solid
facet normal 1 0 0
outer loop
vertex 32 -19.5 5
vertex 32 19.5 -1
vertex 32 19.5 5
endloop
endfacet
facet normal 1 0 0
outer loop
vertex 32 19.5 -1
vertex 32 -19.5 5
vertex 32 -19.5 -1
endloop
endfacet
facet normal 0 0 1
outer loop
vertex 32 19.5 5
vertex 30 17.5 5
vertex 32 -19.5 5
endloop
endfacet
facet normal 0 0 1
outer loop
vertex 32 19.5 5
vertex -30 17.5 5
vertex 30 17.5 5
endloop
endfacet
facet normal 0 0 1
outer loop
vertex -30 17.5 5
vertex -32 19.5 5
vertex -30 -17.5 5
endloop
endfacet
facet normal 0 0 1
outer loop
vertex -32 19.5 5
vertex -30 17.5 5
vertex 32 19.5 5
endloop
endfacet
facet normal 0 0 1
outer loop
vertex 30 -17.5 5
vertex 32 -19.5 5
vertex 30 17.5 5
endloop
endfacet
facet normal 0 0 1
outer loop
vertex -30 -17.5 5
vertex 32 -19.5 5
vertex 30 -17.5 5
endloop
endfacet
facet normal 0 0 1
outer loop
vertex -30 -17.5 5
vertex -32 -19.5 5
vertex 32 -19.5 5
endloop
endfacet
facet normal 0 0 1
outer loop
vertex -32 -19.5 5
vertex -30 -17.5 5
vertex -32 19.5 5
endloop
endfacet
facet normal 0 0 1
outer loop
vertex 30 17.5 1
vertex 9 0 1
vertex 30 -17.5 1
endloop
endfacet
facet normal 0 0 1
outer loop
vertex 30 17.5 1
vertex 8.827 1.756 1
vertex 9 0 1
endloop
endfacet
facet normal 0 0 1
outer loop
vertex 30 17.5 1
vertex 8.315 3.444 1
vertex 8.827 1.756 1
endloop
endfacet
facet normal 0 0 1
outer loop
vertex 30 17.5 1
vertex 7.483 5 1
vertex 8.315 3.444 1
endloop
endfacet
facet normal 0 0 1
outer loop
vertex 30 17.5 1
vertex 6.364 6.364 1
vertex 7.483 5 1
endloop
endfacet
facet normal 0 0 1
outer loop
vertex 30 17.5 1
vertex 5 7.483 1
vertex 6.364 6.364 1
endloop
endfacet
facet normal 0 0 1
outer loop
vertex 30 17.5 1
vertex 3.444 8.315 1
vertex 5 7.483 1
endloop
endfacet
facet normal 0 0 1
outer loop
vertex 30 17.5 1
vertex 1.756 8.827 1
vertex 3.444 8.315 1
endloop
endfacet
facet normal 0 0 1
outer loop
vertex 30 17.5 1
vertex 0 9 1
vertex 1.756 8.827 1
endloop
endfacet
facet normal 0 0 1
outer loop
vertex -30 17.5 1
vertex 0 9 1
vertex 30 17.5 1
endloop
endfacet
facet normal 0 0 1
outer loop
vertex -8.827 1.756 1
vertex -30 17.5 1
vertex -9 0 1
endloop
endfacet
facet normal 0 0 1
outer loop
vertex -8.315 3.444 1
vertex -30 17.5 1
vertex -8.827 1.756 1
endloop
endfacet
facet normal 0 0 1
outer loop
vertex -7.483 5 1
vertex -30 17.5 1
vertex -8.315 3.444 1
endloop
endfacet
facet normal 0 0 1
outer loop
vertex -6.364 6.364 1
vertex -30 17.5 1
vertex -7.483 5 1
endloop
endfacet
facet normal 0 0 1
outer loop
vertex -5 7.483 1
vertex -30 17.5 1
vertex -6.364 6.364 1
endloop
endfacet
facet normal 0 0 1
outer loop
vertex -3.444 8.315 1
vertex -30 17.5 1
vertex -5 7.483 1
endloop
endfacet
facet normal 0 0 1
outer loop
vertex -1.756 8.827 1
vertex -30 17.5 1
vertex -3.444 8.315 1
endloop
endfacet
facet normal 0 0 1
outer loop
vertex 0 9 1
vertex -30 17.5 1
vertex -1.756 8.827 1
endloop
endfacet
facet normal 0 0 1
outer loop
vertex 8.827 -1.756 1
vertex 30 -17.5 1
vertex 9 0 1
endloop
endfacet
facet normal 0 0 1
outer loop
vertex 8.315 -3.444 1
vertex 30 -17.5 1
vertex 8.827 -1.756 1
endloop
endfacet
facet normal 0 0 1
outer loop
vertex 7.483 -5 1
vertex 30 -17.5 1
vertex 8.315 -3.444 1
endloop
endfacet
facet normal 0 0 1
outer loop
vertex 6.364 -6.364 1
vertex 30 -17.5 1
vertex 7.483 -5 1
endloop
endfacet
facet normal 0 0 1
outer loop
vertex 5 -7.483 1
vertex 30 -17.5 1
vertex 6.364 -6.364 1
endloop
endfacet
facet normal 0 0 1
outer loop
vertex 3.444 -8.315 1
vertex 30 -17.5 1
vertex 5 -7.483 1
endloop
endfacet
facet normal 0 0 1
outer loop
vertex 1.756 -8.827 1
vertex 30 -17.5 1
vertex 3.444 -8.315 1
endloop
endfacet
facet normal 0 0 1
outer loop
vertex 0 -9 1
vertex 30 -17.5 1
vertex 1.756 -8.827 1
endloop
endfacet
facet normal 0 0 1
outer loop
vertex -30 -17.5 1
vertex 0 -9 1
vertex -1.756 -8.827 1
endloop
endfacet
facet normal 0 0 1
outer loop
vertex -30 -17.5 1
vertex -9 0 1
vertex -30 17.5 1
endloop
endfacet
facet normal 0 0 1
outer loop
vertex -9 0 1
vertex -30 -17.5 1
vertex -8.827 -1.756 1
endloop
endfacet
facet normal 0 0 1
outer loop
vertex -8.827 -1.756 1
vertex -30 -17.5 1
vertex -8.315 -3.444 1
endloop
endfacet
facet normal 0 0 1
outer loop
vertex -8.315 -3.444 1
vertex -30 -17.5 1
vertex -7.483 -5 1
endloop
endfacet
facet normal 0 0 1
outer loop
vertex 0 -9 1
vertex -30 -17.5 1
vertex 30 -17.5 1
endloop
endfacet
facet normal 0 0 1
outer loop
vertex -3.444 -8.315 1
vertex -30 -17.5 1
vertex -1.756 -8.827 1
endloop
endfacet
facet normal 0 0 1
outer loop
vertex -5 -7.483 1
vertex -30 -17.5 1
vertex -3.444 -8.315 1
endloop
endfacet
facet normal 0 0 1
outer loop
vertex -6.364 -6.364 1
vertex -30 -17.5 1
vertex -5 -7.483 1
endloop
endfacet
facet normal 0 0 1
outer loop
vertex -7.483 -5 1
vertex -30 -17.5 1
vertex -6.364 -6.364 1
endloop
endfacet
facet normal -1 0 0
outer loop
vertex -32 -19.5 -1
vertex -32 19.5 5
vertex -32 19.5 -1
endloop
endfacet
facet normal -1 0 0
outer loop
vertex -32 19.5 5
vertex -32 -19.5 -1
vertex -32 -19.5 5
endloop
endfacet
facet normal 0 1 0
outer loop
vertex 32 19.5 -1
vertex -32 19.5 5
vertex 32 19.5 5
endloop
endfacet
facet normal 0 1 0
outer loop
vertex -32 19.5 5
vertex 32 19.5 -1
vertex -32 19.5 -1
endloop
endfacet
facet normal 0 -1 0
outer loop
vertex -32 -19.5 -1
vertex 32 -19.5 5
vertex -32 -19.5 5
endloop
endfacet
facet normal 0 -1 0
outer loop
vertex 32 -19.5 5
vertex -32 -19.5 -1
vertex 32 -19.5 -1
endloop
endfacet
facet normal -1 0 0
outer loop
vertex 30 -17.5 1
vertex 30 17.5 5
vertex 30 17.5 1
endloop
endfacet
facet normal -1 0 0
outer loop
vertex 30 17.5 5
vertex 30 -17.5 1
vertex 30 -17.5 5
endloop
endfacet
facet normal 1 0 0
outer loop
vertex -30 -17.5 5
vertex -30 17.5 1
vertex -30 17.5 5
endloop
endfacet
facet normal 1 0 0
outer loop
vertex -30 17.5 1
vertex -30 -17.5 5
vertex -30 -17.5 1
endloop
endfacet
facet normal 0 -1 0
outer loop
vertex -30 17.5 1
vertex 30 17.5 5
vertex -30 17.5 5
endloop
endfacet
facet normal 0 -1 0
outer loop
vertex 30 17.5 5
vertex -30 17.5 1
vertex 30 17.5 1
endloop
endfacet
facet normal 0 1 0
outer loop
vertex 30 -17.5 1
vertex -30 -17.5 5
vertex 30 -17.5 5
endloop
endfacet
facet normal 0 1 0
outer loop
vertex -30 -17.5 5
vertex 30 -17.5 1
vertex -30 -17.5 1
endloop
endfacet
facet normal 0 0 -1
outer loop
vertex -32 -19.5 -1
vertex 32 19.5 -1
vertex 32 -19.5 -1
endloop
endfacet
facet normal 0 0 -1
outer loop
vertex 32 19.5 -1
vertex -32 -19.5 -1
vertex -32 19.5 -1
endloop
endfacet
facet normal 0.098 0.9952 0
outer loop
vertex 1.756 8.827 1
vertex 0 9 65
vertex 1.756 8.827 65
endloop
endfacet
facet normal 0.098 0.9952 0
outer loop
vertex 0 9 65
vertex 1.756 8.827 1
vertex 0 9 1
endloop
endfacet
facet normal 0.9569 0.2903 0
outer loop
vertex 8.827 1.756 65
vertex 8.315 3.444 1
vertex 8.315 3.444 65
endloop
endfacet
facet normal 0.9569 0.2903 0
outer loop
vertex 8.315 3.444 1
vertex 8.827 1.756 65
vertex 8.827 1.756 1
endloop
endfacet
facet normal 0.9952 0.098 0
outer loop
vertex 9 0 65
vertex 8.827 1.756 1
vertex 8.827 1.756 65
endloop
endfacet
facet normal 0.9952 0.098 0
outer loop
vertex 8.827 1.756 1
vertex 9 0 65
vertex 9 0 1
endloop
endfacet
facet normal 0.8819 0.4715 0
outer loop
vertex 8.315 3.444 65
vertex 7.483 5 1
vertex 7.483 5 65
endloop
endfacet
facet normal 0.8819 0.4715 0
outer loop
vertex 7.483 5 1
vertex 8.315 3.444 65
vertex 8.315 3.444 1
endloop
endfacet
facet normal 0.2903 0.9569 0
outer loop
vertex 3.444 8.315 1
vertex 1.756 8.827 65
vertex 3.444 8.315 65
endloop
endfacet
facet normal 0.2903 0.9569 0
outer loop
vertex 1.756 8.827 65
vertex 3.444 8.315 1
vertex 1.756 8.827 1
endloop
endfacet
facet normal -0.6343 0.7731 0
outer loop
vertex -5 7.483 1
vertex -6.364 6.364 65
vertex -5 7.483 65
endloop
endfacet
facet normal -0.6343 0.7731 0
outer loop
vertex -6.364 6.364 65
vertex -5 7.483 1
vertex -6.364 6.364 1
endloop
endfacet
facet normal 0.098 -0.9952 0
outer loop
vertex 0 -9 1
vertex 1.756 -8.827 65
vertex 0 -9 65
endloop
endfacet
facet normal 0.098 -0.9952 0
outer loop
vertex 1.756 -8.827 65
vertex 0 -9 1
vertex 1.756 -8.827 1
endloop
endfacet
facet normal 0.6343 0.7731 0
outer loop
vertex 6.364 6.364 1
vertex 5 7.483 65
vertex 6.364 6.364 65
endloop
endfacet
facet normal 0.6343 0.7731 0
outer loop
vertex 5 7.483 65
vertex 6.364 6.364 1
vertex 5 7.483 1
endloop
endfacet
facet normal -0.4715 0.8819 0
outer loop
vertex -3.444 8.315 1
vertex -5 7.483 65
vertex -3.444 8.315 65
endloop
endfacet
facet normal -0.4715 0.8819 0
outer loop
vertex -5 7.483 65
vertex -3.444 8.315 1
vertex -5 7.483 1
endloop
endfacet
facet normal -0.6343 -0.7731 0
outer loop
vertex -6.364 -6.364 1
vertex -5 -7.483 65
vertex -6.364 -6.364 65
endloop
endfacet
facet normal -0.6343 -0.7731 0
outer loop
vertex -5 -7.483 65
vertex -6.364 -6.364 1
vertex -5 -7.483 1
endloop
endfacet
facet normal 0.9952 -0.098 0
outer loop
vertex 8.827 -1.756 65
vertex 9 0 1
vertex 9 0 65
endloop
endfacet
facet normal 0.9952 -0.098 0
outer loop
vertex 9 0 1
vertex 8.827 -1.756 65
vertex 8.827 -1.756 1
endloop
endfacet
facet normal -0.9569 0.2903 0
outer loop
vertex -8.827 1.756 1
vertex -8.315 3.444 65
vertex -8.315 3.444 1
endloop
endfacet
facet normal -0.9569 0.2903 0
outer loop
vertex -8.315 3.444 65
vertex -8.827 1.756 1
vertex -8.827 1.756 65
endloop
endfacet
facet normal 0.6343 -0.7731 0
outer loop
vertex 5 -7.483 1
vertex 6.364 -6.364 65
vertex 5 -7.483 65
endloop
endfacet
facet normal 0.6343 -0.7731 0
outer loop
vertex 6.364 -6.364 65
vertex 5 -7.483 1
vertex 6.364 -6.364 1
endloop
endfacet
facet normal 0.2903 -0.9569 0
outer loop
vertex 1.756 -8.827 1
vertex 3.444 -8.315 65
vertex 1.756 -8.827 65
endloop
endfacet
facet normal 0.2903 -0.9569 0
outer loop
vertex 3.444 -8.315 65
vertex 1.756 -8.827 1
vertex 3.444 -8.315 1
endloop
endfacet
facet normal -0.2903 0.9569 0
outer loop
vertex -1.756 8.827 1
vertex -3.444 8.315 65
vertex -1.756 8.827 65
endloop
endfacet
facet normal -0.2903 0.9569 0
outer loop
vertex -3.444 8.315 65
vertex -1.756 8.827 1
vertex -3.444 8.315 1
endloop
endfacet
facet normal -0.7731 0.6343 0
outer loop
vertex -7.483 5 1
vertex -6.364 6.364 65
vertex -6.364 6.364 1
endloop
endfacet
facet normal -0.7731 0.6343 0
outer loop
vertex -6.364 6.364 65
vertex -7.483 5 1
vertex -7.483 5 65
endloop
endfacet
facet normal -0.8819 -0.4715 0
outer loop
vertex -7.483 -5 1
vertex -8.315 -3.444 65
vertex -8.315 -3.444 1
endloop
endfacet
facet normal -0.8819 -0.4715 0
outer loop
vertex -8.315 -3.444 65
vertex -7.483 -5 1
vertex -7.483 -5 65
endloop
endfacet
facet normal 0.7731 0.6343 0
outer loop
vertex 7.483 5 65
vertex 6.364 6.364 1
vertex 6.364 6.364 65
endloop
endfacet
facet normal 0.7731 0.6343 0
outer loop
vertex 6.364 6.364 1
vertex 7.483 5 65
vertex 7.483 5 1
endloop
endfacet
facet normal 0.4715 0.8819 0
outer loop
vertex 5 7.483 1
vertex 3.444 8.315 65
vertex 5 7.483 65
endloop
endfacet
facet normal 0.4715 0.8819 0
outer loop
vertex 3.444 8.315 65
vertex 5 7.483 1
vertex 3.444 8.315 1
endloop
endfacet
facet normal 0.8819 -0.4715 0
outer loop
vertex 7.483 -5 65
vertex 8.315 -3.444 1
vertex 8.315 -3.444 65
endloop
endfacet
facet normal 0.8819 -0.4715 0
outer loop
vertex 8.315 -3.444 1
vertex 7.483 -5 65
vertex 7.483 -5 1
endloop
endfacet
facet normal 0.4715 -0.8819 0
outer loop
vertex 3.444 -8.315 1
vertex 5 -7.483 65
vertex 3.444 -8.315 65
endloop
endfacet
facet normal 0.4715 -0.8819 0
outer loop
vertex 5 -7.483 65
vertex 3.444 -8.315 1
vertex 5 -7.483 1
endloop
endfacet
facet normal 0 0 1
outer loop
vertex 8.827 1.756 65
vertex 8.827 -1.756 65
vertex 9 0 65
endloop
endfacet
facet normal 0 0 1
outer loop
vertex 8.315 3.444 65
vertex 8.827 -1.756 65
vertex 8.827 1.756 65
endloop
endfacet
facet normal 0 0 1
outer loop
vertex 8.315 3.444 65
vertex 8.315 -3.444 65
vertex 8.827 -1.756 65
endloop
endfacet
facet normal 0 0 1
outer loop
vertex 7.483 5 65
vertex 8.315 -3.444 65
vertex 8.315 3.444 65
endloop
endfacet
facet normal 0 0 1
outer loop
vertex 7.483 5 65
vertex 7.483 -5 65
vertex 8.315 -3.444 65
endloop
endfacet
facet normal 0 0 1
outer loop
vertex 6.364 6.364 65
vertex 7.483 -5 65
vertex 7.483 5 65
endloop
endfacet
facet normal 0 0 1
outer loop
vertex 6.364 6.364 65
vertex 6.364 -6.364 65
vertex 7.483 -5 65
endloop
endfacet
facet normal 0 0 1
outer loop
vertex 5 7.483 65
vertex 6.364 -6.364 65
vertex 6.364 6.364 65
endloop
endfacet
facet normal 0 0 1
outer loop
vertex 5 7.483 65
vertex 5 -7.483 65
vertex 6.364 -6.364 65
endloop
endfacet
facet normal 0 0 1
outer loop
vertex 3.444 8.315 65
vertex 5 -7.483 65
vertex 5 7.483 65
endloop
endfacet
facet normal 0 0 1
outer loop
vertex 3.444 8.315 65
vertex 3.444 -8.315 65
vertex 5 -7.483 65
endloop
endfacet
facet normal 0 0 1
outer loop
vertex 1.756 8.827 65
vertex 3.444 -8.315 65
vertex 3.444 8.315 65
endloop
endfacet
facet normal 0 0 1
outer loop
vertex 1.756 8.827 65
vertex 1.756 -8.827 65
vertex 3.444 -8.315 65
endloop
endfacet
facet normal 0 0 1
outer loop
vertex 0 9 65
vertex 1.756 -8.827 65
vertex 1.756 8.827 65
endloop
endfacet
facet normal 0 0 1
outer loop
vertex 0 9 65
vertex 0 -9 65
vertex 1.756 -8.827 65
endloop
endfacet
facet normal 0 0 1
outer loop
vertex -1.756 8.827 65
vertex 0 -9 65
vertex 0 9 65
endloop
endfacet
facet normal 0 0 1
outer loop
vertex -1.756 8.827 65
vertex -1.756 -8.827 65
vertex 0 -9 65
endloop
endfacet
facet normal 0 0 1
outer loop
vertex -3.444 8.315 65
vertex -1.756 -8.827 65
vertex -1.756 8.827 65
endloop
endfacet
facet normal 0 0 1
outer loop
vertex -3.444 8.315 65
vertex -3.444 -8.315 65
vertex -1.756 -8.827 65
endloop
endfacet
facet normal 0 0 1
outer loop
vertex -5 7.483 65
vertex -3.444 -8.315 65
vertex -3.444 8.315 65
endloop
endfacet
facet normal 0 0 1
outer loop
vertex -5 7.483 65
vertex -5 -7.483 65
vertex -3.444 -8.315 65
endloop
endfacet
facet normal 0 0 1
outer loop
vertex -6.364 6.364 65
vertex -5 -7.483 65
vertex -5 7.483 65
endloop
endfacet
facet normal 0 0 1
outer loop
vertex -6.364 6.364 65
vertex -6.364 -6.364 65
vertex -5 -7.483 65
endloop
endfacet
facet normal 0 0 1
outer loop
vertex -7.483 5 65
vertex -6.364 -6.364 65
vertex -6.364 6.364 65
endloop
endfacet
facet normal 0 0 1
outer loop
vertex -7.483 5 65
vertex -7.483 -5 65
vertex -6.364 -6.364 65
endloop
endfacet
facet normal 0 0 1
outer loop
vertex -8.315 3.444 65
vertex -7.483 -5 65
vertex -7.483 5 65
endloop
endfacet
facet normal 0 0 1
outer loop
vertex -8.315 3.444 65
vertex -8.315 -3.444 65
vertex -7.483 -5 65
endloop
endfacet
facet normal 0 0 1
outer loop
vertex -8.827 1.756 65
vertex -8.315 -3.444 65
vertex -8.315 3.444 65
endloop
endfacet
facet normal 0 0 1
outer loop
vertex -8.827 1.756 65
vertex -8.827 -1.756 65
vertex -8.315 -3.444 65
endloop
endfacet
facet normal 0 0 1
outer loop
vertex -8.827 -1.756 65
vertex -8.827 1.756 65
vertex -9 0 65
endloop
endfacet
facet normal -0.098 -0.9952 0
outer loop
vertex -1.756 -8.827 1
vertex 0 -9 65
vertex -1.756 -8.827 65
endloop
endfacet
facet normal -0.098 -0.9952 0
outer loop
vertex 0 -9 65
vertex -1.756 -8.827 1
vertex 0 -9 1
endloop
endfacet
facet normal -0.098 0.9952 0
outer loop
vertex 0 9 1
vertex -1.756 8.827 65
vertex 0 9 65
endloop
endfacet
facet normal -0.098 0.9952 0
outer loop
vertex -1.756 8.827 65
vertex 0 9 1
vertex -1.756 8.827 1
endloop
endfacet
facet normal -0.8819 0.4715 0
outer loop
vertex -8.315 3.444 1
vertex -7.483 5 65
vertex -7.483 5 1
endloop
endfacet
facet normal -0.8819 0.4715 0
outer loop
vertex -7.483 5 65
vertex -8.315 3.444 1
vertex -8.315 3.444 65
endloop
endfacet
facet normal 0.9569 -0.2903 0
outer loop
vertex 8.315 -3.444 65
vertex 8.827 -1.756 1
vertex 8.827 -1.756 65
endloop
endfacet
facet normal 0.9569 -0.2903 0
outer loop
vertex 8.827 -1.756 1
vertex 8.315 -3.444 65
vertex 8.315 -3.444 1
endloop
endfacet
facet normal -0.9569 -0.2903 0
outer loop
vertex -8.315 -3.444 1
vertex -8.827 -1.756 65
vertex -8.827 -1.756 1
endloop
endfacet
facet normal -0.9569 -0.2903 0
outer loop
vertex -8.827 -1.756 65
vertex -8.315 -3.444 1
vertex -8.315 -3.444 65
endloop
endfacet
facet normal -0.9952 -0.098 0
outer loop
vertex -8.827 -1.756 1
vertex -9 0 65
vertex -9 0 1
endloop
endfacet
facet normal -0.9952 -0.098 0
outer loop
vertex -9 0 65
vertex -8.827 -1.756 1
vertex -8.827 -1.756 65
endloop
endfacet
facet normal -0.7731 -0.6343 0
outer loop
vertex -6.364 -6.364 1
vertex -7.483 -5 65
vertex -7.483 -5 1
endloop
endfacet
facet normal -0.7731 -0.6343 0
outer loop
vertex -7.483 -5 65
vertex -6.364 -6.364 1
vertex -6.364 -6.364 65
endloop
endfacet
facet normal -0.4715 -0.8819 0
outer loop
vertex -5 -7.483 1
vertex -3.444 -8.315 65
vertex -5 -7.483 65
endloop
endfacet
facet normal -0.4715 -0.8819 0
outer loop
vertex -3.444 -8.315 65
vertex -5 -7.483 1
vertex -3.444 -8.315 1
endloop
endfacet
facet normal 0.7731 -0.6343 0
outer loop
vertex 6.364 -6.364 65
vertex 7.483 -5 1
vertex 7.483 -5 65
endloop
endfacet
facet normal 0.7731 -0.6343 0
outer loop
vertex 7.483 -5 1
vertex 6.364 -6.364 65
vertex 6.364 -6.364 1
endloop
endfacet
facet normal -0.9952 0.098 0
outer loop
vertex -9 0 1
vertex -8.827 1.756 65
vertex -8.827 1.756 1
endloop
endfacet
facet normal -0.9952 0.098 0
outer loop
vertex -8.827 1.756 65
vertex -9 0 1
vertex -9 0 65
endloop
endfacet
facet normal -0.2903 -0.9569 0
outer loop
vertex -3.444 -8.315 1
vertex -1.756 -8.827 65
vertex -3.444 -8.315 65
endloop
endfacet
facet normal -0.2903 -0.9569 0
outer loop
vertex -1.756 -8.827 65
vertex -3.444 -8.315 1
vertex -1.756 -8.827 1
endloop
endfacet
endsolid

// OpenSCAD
// file: akkum18650.scad
echo("Работа Тимура Огрельцева");

akkum18650();
module akkum18650() {
color("purple")
cylinder(d=18, h=65, $fn=32);
}
// main file
use <akkum18650.scad>

echo("Работа Огорельцева Тимура!");
w_frame = 65;
d_frame = 5;
h_frame = 40;
fitnes_frame = 4;

w_back = 60;
h_back = 35;
thickness_back = 1;
thickness_walls = 2;
thickness_bottom = 2;
h_walls = 4;


//frame1();


//rotate([90, 0, 0])
//translate([0, 0, 3])
//backlight();
kit_frame();
akkum18650();

module kit_frame(){
bottom();
color("blue")
translate([0, 0, h_walls/2+thickness_bottom/2])
walls();
}

module walls(){
    difference(){
        cube([w_back + 2*thickness_walls, h_back+2*thickness_walls, h_walls],center = true);
        color ("red")
        cube([w_back, h_back, h_walls +1],center = true);
    }
}
module bottom(){
cube([w_back + 2*thickness_walls, h_back+2*thickness_walls, thickness_bottom],center = true);
}

module backlight() {
    color("lightgreen")
    cube([w_back, h_back, thickness_back], center = true);
}

module frame1(){
    difference() {
        cube([w_frame, d_frame, h_frame], center = true);
        color("red")
        cube([w_frame - 2*fitnes_frame, d_frame + 1, h_frame - 2* fitnes_frame ], center =true);
    }
}
